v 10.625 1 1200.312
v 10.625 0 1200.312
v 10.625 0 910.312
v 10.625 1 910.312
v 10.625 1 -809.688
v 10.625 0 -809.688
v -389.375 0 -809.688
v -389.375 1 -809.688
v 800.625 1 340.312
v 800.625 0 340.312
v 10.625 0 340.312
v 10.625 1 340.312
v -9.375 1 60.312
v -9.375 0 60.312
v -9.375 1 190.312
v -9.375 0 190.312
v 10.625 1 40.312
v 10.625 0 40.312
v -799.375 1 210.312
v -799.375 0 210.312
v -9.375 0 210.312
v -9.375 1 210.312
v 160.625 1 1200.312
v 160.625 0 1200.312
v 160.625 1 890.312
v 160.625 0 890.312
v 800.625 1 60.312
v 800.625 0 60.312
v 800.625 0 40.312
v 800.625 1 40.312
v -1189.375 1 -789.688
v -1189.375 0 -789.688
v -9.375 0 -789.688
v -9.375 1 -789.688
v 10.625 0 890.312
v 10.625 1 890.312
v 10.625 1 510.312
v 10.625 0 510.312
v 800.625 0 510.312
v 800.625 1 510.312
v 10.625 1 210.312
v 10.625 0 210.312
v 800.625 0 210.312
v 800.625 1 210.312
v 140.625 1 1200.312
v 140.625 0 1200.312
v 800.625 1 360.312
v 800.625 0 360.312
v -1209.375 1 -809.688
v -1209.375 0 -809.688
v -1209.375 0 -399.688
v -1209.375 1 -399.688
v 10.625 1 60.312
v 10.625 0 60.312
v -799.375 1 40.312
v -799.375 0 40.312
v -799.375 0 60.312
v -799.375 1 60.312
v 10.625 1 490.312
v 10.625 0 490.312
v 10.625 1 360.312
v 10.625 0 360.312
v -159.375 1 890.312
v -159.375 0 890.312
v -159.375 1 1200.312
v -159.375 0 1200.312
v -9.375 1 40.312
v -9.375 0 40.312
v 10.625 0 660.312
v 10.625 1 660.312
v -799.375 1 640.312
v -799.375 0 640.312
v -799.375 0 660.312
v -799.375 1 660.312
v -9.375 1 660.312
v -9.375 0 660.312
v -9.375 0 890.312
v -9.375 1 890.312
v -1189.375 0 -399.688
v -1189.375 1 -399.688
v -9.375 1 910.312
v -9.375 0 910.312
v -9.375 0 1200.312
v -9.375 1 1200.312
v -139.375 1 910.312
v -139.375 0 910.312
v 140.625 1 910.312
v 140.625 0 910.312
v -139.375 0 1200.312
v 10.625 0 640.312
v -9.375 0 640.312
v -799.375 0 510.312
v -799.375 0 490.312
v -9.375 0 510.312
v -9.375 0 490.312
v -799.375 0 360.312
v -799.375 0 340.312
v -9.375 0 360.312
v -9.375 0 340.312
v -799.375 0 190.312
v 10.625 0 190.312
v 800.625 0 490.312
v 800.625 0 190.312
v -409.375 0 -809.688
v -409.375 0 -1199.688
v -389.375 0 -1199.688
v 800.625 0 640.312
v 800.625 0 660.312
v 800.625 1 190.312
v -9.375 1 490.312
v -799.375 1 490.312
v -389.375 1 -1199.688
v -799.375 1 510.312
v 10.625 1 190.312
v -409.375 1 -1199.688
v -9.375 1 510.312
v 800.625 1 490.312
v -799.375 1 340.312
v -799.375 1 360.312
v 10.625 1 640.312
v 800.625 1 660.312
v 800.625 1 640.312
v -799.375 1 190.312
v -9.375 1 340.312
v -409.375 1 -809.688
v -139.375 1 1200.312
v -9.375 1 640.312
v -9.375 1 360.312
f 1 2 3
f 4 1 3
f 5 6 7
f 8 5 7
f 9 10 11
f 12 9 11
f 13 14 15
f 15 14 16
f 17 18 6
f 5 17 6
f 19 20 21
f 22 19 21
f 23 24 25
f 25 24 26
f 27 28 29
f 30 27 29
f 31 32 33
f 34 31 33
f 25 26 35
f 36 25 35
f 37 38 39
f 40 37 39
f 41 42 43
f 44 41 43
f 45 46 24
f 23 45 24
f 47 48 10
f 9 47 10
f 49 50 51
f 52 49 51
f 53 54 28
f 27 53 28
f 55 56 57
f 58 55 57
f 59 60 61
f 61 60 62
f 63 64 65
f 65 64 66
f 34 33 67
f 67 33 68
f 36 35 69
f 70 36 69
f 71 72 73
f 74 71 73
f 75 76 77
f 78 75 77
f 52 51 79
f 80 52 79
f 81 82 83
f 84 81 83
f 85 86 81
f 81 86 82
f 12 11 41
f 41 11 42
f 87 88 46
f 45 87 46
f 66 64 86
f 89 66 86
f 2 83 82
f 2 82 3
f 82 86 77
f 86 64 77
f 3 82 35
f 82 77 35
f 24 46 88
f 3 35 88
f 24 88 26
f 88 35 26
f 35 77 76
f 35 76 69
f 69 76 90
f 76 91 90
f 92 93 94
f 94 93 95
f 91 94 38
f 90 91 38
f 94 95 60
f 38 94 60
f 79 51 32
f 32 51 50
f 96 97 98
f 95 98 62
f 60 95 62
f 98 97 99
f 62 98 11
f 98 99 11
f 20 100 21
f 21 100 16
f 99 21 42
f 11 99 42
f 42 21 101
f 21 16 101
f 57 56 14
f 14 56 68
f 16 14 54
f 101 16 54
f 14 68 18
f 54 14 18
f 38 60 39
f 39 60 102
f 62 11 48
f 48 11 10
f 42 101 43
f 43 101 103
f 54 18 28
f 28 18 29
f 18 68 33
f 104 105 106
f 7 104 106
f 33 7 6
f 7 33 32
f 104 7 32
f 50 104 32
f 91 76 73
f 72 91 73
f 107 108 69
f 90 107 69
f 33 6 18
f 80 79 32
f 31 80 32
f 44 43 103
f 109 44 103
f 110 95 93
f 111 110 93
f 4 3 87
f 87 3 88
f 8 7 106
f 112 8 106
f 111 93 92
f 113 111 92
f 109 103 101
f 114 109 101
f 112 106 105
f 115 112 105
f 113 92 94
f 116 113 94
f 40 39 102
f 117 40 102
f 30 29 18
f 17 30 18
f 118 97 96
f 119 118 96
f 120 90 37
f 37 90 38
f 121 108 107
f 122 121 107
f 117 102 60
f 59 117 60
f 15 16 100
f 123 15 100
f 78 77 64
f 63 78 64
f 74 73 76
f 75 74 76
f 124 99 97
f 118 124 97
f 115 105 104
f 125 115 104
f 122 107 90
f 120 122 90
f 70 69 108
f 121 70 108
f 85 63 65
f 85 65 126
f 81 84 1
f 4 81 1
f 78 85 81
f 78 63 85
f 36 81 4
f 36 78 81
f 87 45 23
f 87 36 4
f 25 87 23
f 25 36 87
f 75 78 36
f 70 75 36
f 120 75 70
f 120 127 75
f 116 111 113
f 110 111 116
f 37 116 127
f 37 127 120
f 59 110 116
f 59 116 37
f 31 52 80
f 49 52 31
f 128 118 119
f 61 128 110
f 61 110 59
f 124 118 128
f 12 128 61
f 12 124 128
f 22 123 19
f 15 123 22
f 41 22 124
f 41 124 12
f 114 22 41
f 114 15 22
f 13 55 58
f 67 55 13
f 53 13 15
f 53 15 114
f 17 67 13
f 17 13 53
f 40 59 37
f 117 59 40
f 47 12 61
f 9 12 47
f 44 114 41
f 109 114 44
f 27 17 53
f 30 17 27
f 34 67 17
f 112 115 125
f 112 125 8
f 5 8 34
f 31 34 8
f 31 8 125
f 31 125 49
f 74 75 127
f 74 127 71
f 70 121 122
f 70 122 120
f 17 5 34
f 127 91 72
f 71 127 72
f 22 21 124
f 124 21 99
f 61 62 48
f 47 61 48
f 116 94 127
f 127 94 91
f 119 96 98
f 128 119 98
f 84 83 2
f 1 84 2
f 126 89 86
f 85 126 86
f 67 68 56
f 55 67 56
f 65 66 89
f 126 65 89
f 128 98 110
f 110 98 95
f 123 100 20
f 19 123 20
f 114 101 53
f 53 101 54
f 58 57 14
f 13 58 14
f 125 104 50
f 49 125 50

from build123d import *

# Parameters (mm, degrees)
EXTRUDE_1_DEPTH = 1


with BuildPart() as part:
    # 草图2 → 凸台-拉伸1 (new body)
    with BuildSketch(Plane(origin=(0, 0, 0), x_dir=(1, 0, 0), z_dir=(0, 1, 0))):
        Polygon((-1189.375295585, 399.687647792), (-1189.375295585, 789.687647792), (-9.375295585, 789.687647792), (-9.375295585, -40.312352208), (-799.375295585, -40.312352208), (-799.375295585, -60.312352208), (-9.375295585, -60.312352208), (-9.375295585, -190.312352208), (-799.375295585, -190.312352208), (-799.375295585, -210.312352208), (-9.375295585, -210.312352208), (-9.375295585, -340.312352208), (-799.375295585, -340.312352208), (-799.375295585, -360.312352208), (-9.375295585, -360.312352208), (-9.375295585, -490.312352208), (-799.375295585, -490.312352208), (-799.375295585, -510.312352208), (-9.375295585, -510.312352208), (-9.375295585, -640.312352208), (-799.375295585, -640.312352208), (-799.375295585, -660.312352208), (-9.375295585, -660.312352208), (-9.375295585, -890.312352208), (-159.375295585, -890.312352208), (-159.375295585, -1200.312352208), (-139.375295585, -1200.312352208), (-139.375295585, -910.312352208), (-9.375295585, -910.312352208), (-9.375295585, -1200.312352208), (10.624704415, -1200.312352208), (10.624704415, -910.312352208), (140.624704415, -910.312352208), (140.624704415, -1200.312352208), (160.624704415, -1200.312352208), (160.624704415, -890.312352208), (10.624704415, -890.312352208), (10.624704415, -660.312352208), (800.624704415, -660.312352208), (800.624704415, -640.312352208), (10.624704415, -640.312352208), (10.624704415, -510.312352208), (800.624704415, -510.312352208), (800.624704415, -490.312352208), (10.624704415, -490.312352208), (10.624704415, -360.312352208), (800.624704415, -360.312352208), (800.624704415, -340.312352208), (10.624704415, -340.312352208), (10.624704415, -210.312352208), (800.624704415, -210.312352208), (800.624704415, -190.312352208), (10.624704415, -190.312352208), (10.624704415, -60.312352208), (800.624704415, -60.312352208), (800.624704415, -40.312352208), (10.624704415, -40.312352208), (10.624704415, 799.687647792), (10.624704415, 809.687647792), (-389.375295585, 809.687647792), (-389.375295585, 1199.687647792), (-409.375295585, 1199.687647792), (-409.375295585, 809.687647792), (-1209.375295585, 809.687647792), (-1209.375295585, 399.687647792), align=None)
    extrude(amount=EXTRUDE_1_DEPTH)


solid = part.part
